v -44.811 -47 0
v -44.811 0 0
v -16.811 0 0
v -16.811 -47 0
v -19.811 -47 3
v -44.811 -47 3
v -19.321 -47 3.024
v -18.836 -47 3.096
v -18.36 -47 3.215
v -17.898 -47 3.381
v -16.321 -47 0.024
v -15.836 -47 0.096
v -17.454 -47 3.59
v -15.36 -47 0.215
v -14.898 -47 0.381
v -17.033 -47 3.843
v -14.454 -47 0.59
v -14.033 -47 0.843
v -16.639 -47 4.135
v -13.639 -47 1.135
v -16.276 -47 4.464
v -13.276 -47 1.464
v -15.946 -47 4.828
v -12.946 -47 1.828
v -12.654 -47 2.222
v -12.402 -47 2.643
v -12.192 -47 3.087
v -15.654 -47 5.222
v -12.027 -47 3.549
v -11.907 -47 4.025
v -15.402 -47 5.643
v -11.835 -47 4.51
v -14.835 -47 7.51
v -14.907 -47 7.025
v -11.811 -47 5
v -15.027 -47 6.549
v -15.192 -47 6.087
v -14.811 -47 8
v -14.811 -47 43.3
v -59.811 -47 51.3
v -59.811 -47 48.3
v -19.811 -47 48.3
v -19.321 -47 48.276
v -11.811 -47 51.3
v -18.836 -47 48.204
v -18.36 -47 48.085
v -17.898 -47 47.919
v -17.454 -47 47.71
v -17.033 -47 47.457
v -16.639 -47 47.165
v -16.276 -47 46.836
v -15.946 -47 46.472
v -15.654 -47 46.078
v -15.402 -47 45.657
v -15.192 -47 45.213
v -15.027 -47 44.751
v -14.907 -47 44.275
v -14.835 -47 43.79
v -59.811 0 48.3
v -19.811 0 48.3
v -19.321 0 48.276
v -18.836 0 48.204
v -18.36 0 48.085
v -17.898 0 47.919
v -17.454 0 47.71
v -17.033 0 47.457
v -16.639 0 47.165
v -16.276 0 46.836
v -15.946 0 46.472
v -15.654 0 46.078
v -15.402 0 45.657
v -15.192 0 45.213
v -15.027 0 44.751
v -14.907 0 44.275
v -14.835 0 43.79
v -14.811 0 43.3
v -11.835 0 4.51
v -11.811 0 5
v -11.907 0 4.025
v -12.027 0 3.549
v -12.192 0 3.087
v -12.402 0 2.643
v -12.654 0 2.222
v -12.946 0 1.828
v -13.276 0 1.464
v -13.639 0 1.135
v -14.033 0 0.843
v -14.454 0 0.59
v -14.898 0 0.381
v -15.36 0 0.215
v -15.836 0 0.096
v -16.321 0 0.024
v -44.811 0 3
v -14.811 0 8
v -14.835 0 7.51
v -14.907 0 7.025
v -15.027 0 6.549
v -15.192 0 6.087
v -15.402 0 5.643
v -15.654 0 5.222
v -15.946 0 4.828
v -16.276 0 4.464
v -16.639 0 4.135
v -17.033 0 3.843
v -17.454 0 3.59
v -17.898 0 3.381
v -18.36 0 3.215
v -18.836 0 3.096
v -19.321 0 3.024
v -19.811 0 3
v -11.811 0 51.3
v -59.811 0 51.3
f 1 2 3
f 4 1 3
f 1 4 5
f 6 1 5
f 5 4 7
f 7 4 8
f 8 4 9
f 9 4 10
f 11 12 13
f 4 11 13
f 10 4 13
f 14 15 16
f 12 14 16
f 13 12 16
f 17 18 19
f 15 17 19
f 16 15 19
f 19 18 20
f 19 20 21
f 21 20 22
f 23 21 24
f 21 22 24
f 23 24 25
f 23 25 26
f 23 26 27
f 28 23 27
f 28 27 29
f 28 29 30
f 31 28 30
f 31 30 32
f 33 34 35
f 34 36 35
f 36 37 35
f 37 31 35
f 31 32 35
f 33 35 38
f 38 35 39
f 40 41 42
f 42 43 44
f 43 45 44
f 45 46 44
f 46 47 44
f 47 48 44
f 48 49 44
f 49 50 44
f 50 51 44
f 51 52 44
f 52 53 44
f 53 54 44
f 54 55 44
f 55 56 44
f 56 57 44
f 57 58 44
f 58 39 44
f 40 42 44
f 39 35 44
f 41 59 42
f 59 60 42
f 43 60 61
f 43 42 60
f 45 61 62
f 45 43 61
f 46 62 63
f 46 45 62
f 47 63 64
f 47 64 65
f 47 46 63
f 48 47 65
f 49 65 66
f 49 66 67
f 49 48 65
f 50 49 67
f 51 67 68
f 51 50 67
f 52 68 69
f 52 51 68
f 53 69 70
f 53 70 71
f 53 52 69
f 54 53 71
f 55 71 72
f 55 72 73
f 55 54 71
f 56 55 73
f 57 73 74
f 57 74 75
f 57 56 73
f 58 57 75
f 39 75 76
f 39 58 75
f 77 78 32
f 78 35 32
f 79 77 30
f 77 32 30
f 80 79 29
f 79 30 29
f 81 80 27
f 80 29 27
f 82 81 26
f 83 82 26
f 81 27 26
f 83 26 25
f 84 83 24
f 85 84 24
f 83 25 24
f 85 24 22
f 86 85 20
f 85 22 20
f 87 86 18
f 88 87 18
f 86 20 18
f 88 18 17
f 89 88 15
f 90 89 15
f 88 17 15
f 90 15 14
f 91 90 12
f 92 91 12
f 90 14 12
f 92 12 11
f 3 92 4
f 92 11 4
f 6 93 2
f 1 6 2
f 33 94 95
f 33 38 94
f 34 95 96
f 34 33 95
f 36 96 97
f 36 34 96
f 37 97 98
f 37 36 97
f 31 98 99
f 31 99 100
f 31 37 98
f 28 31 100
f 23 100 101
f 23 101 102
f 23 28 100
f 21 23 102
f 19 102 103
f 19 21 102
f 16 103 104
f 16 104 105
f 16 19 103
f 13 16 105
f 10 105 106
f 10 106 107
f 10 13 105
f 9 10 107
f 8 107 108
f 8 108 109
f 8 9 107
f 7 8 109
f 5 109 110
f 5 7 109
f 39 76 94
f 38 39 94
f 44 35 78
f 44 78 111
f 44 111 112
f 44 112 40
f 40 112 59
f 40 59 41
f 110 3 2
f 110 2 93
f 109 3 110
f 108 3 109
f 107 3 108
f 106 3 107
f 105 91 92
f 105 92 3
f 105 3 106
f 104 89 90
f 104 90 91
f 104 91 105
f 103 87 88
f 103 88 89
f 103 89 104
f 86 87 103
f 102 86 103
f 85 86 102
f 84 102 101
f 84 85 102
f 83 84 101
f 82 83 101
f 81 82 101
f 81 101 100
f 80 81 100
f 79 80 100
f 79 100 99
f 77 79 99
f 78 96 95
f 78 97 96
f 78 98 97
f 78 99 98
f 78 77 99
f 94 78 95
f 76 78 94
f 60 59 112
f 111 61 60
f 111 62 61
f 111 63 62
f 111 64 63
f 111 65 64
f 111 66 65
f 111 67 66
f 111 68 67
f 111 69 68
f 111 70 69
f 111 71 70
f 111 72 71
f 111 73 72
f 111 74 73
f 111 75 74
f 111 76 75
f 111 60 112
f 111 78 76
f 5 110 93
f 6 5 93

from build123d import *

# Parameters (mm, degrees)
F1_DEPTH  = 47
F2_R      = 5
F3_R      = 5
F1_FACE_W = 47
F1_FACE_H = 3
F4_DEPTH  = 15


with BuildPart() as f1:
    # F0 (on Front) → F1 (new body)
    with BuildSketch(Plane.XZ):
        Polygon((-11.811316, 51.3), (-44.811316, 51.3), (-44.811316, 48.3), (-14.811316, 48.3), (-14.811316, 3), (-44.811316, 3), (-44.811316, 0), (-11.811316, 0), align=None)
    extrude(amount=F1_DEPTH)

    # F2
    f2_edges = [f1.edges().sort_by_distance(p)[0] for p in [
        (-14.811316, -23.5, 3),
        (-14.811316, -23.5, 48.3),
    ]]
    fillet(f2_edges, radius=F2_R)

    # F3
    f3_edges = [f1.edges().sort_by_distance(p)[0] for p in [
        (-11.811316, -23.5, 0),
    ]]
    fillet(f3_edges, radius=F3_R)

    # F1_face (on face) → F4 (join)
    with BuildSketch(Plane(origin=(-44.811316, -23.5, 49.8), x_dir=(0, -1, 0), z_dir=(-1, 0, 0))):
        Rectangle(F1_FACE_W, F1_FACE_H)
    extrude(amount=F4_DEPTH)


solid = f1.part
